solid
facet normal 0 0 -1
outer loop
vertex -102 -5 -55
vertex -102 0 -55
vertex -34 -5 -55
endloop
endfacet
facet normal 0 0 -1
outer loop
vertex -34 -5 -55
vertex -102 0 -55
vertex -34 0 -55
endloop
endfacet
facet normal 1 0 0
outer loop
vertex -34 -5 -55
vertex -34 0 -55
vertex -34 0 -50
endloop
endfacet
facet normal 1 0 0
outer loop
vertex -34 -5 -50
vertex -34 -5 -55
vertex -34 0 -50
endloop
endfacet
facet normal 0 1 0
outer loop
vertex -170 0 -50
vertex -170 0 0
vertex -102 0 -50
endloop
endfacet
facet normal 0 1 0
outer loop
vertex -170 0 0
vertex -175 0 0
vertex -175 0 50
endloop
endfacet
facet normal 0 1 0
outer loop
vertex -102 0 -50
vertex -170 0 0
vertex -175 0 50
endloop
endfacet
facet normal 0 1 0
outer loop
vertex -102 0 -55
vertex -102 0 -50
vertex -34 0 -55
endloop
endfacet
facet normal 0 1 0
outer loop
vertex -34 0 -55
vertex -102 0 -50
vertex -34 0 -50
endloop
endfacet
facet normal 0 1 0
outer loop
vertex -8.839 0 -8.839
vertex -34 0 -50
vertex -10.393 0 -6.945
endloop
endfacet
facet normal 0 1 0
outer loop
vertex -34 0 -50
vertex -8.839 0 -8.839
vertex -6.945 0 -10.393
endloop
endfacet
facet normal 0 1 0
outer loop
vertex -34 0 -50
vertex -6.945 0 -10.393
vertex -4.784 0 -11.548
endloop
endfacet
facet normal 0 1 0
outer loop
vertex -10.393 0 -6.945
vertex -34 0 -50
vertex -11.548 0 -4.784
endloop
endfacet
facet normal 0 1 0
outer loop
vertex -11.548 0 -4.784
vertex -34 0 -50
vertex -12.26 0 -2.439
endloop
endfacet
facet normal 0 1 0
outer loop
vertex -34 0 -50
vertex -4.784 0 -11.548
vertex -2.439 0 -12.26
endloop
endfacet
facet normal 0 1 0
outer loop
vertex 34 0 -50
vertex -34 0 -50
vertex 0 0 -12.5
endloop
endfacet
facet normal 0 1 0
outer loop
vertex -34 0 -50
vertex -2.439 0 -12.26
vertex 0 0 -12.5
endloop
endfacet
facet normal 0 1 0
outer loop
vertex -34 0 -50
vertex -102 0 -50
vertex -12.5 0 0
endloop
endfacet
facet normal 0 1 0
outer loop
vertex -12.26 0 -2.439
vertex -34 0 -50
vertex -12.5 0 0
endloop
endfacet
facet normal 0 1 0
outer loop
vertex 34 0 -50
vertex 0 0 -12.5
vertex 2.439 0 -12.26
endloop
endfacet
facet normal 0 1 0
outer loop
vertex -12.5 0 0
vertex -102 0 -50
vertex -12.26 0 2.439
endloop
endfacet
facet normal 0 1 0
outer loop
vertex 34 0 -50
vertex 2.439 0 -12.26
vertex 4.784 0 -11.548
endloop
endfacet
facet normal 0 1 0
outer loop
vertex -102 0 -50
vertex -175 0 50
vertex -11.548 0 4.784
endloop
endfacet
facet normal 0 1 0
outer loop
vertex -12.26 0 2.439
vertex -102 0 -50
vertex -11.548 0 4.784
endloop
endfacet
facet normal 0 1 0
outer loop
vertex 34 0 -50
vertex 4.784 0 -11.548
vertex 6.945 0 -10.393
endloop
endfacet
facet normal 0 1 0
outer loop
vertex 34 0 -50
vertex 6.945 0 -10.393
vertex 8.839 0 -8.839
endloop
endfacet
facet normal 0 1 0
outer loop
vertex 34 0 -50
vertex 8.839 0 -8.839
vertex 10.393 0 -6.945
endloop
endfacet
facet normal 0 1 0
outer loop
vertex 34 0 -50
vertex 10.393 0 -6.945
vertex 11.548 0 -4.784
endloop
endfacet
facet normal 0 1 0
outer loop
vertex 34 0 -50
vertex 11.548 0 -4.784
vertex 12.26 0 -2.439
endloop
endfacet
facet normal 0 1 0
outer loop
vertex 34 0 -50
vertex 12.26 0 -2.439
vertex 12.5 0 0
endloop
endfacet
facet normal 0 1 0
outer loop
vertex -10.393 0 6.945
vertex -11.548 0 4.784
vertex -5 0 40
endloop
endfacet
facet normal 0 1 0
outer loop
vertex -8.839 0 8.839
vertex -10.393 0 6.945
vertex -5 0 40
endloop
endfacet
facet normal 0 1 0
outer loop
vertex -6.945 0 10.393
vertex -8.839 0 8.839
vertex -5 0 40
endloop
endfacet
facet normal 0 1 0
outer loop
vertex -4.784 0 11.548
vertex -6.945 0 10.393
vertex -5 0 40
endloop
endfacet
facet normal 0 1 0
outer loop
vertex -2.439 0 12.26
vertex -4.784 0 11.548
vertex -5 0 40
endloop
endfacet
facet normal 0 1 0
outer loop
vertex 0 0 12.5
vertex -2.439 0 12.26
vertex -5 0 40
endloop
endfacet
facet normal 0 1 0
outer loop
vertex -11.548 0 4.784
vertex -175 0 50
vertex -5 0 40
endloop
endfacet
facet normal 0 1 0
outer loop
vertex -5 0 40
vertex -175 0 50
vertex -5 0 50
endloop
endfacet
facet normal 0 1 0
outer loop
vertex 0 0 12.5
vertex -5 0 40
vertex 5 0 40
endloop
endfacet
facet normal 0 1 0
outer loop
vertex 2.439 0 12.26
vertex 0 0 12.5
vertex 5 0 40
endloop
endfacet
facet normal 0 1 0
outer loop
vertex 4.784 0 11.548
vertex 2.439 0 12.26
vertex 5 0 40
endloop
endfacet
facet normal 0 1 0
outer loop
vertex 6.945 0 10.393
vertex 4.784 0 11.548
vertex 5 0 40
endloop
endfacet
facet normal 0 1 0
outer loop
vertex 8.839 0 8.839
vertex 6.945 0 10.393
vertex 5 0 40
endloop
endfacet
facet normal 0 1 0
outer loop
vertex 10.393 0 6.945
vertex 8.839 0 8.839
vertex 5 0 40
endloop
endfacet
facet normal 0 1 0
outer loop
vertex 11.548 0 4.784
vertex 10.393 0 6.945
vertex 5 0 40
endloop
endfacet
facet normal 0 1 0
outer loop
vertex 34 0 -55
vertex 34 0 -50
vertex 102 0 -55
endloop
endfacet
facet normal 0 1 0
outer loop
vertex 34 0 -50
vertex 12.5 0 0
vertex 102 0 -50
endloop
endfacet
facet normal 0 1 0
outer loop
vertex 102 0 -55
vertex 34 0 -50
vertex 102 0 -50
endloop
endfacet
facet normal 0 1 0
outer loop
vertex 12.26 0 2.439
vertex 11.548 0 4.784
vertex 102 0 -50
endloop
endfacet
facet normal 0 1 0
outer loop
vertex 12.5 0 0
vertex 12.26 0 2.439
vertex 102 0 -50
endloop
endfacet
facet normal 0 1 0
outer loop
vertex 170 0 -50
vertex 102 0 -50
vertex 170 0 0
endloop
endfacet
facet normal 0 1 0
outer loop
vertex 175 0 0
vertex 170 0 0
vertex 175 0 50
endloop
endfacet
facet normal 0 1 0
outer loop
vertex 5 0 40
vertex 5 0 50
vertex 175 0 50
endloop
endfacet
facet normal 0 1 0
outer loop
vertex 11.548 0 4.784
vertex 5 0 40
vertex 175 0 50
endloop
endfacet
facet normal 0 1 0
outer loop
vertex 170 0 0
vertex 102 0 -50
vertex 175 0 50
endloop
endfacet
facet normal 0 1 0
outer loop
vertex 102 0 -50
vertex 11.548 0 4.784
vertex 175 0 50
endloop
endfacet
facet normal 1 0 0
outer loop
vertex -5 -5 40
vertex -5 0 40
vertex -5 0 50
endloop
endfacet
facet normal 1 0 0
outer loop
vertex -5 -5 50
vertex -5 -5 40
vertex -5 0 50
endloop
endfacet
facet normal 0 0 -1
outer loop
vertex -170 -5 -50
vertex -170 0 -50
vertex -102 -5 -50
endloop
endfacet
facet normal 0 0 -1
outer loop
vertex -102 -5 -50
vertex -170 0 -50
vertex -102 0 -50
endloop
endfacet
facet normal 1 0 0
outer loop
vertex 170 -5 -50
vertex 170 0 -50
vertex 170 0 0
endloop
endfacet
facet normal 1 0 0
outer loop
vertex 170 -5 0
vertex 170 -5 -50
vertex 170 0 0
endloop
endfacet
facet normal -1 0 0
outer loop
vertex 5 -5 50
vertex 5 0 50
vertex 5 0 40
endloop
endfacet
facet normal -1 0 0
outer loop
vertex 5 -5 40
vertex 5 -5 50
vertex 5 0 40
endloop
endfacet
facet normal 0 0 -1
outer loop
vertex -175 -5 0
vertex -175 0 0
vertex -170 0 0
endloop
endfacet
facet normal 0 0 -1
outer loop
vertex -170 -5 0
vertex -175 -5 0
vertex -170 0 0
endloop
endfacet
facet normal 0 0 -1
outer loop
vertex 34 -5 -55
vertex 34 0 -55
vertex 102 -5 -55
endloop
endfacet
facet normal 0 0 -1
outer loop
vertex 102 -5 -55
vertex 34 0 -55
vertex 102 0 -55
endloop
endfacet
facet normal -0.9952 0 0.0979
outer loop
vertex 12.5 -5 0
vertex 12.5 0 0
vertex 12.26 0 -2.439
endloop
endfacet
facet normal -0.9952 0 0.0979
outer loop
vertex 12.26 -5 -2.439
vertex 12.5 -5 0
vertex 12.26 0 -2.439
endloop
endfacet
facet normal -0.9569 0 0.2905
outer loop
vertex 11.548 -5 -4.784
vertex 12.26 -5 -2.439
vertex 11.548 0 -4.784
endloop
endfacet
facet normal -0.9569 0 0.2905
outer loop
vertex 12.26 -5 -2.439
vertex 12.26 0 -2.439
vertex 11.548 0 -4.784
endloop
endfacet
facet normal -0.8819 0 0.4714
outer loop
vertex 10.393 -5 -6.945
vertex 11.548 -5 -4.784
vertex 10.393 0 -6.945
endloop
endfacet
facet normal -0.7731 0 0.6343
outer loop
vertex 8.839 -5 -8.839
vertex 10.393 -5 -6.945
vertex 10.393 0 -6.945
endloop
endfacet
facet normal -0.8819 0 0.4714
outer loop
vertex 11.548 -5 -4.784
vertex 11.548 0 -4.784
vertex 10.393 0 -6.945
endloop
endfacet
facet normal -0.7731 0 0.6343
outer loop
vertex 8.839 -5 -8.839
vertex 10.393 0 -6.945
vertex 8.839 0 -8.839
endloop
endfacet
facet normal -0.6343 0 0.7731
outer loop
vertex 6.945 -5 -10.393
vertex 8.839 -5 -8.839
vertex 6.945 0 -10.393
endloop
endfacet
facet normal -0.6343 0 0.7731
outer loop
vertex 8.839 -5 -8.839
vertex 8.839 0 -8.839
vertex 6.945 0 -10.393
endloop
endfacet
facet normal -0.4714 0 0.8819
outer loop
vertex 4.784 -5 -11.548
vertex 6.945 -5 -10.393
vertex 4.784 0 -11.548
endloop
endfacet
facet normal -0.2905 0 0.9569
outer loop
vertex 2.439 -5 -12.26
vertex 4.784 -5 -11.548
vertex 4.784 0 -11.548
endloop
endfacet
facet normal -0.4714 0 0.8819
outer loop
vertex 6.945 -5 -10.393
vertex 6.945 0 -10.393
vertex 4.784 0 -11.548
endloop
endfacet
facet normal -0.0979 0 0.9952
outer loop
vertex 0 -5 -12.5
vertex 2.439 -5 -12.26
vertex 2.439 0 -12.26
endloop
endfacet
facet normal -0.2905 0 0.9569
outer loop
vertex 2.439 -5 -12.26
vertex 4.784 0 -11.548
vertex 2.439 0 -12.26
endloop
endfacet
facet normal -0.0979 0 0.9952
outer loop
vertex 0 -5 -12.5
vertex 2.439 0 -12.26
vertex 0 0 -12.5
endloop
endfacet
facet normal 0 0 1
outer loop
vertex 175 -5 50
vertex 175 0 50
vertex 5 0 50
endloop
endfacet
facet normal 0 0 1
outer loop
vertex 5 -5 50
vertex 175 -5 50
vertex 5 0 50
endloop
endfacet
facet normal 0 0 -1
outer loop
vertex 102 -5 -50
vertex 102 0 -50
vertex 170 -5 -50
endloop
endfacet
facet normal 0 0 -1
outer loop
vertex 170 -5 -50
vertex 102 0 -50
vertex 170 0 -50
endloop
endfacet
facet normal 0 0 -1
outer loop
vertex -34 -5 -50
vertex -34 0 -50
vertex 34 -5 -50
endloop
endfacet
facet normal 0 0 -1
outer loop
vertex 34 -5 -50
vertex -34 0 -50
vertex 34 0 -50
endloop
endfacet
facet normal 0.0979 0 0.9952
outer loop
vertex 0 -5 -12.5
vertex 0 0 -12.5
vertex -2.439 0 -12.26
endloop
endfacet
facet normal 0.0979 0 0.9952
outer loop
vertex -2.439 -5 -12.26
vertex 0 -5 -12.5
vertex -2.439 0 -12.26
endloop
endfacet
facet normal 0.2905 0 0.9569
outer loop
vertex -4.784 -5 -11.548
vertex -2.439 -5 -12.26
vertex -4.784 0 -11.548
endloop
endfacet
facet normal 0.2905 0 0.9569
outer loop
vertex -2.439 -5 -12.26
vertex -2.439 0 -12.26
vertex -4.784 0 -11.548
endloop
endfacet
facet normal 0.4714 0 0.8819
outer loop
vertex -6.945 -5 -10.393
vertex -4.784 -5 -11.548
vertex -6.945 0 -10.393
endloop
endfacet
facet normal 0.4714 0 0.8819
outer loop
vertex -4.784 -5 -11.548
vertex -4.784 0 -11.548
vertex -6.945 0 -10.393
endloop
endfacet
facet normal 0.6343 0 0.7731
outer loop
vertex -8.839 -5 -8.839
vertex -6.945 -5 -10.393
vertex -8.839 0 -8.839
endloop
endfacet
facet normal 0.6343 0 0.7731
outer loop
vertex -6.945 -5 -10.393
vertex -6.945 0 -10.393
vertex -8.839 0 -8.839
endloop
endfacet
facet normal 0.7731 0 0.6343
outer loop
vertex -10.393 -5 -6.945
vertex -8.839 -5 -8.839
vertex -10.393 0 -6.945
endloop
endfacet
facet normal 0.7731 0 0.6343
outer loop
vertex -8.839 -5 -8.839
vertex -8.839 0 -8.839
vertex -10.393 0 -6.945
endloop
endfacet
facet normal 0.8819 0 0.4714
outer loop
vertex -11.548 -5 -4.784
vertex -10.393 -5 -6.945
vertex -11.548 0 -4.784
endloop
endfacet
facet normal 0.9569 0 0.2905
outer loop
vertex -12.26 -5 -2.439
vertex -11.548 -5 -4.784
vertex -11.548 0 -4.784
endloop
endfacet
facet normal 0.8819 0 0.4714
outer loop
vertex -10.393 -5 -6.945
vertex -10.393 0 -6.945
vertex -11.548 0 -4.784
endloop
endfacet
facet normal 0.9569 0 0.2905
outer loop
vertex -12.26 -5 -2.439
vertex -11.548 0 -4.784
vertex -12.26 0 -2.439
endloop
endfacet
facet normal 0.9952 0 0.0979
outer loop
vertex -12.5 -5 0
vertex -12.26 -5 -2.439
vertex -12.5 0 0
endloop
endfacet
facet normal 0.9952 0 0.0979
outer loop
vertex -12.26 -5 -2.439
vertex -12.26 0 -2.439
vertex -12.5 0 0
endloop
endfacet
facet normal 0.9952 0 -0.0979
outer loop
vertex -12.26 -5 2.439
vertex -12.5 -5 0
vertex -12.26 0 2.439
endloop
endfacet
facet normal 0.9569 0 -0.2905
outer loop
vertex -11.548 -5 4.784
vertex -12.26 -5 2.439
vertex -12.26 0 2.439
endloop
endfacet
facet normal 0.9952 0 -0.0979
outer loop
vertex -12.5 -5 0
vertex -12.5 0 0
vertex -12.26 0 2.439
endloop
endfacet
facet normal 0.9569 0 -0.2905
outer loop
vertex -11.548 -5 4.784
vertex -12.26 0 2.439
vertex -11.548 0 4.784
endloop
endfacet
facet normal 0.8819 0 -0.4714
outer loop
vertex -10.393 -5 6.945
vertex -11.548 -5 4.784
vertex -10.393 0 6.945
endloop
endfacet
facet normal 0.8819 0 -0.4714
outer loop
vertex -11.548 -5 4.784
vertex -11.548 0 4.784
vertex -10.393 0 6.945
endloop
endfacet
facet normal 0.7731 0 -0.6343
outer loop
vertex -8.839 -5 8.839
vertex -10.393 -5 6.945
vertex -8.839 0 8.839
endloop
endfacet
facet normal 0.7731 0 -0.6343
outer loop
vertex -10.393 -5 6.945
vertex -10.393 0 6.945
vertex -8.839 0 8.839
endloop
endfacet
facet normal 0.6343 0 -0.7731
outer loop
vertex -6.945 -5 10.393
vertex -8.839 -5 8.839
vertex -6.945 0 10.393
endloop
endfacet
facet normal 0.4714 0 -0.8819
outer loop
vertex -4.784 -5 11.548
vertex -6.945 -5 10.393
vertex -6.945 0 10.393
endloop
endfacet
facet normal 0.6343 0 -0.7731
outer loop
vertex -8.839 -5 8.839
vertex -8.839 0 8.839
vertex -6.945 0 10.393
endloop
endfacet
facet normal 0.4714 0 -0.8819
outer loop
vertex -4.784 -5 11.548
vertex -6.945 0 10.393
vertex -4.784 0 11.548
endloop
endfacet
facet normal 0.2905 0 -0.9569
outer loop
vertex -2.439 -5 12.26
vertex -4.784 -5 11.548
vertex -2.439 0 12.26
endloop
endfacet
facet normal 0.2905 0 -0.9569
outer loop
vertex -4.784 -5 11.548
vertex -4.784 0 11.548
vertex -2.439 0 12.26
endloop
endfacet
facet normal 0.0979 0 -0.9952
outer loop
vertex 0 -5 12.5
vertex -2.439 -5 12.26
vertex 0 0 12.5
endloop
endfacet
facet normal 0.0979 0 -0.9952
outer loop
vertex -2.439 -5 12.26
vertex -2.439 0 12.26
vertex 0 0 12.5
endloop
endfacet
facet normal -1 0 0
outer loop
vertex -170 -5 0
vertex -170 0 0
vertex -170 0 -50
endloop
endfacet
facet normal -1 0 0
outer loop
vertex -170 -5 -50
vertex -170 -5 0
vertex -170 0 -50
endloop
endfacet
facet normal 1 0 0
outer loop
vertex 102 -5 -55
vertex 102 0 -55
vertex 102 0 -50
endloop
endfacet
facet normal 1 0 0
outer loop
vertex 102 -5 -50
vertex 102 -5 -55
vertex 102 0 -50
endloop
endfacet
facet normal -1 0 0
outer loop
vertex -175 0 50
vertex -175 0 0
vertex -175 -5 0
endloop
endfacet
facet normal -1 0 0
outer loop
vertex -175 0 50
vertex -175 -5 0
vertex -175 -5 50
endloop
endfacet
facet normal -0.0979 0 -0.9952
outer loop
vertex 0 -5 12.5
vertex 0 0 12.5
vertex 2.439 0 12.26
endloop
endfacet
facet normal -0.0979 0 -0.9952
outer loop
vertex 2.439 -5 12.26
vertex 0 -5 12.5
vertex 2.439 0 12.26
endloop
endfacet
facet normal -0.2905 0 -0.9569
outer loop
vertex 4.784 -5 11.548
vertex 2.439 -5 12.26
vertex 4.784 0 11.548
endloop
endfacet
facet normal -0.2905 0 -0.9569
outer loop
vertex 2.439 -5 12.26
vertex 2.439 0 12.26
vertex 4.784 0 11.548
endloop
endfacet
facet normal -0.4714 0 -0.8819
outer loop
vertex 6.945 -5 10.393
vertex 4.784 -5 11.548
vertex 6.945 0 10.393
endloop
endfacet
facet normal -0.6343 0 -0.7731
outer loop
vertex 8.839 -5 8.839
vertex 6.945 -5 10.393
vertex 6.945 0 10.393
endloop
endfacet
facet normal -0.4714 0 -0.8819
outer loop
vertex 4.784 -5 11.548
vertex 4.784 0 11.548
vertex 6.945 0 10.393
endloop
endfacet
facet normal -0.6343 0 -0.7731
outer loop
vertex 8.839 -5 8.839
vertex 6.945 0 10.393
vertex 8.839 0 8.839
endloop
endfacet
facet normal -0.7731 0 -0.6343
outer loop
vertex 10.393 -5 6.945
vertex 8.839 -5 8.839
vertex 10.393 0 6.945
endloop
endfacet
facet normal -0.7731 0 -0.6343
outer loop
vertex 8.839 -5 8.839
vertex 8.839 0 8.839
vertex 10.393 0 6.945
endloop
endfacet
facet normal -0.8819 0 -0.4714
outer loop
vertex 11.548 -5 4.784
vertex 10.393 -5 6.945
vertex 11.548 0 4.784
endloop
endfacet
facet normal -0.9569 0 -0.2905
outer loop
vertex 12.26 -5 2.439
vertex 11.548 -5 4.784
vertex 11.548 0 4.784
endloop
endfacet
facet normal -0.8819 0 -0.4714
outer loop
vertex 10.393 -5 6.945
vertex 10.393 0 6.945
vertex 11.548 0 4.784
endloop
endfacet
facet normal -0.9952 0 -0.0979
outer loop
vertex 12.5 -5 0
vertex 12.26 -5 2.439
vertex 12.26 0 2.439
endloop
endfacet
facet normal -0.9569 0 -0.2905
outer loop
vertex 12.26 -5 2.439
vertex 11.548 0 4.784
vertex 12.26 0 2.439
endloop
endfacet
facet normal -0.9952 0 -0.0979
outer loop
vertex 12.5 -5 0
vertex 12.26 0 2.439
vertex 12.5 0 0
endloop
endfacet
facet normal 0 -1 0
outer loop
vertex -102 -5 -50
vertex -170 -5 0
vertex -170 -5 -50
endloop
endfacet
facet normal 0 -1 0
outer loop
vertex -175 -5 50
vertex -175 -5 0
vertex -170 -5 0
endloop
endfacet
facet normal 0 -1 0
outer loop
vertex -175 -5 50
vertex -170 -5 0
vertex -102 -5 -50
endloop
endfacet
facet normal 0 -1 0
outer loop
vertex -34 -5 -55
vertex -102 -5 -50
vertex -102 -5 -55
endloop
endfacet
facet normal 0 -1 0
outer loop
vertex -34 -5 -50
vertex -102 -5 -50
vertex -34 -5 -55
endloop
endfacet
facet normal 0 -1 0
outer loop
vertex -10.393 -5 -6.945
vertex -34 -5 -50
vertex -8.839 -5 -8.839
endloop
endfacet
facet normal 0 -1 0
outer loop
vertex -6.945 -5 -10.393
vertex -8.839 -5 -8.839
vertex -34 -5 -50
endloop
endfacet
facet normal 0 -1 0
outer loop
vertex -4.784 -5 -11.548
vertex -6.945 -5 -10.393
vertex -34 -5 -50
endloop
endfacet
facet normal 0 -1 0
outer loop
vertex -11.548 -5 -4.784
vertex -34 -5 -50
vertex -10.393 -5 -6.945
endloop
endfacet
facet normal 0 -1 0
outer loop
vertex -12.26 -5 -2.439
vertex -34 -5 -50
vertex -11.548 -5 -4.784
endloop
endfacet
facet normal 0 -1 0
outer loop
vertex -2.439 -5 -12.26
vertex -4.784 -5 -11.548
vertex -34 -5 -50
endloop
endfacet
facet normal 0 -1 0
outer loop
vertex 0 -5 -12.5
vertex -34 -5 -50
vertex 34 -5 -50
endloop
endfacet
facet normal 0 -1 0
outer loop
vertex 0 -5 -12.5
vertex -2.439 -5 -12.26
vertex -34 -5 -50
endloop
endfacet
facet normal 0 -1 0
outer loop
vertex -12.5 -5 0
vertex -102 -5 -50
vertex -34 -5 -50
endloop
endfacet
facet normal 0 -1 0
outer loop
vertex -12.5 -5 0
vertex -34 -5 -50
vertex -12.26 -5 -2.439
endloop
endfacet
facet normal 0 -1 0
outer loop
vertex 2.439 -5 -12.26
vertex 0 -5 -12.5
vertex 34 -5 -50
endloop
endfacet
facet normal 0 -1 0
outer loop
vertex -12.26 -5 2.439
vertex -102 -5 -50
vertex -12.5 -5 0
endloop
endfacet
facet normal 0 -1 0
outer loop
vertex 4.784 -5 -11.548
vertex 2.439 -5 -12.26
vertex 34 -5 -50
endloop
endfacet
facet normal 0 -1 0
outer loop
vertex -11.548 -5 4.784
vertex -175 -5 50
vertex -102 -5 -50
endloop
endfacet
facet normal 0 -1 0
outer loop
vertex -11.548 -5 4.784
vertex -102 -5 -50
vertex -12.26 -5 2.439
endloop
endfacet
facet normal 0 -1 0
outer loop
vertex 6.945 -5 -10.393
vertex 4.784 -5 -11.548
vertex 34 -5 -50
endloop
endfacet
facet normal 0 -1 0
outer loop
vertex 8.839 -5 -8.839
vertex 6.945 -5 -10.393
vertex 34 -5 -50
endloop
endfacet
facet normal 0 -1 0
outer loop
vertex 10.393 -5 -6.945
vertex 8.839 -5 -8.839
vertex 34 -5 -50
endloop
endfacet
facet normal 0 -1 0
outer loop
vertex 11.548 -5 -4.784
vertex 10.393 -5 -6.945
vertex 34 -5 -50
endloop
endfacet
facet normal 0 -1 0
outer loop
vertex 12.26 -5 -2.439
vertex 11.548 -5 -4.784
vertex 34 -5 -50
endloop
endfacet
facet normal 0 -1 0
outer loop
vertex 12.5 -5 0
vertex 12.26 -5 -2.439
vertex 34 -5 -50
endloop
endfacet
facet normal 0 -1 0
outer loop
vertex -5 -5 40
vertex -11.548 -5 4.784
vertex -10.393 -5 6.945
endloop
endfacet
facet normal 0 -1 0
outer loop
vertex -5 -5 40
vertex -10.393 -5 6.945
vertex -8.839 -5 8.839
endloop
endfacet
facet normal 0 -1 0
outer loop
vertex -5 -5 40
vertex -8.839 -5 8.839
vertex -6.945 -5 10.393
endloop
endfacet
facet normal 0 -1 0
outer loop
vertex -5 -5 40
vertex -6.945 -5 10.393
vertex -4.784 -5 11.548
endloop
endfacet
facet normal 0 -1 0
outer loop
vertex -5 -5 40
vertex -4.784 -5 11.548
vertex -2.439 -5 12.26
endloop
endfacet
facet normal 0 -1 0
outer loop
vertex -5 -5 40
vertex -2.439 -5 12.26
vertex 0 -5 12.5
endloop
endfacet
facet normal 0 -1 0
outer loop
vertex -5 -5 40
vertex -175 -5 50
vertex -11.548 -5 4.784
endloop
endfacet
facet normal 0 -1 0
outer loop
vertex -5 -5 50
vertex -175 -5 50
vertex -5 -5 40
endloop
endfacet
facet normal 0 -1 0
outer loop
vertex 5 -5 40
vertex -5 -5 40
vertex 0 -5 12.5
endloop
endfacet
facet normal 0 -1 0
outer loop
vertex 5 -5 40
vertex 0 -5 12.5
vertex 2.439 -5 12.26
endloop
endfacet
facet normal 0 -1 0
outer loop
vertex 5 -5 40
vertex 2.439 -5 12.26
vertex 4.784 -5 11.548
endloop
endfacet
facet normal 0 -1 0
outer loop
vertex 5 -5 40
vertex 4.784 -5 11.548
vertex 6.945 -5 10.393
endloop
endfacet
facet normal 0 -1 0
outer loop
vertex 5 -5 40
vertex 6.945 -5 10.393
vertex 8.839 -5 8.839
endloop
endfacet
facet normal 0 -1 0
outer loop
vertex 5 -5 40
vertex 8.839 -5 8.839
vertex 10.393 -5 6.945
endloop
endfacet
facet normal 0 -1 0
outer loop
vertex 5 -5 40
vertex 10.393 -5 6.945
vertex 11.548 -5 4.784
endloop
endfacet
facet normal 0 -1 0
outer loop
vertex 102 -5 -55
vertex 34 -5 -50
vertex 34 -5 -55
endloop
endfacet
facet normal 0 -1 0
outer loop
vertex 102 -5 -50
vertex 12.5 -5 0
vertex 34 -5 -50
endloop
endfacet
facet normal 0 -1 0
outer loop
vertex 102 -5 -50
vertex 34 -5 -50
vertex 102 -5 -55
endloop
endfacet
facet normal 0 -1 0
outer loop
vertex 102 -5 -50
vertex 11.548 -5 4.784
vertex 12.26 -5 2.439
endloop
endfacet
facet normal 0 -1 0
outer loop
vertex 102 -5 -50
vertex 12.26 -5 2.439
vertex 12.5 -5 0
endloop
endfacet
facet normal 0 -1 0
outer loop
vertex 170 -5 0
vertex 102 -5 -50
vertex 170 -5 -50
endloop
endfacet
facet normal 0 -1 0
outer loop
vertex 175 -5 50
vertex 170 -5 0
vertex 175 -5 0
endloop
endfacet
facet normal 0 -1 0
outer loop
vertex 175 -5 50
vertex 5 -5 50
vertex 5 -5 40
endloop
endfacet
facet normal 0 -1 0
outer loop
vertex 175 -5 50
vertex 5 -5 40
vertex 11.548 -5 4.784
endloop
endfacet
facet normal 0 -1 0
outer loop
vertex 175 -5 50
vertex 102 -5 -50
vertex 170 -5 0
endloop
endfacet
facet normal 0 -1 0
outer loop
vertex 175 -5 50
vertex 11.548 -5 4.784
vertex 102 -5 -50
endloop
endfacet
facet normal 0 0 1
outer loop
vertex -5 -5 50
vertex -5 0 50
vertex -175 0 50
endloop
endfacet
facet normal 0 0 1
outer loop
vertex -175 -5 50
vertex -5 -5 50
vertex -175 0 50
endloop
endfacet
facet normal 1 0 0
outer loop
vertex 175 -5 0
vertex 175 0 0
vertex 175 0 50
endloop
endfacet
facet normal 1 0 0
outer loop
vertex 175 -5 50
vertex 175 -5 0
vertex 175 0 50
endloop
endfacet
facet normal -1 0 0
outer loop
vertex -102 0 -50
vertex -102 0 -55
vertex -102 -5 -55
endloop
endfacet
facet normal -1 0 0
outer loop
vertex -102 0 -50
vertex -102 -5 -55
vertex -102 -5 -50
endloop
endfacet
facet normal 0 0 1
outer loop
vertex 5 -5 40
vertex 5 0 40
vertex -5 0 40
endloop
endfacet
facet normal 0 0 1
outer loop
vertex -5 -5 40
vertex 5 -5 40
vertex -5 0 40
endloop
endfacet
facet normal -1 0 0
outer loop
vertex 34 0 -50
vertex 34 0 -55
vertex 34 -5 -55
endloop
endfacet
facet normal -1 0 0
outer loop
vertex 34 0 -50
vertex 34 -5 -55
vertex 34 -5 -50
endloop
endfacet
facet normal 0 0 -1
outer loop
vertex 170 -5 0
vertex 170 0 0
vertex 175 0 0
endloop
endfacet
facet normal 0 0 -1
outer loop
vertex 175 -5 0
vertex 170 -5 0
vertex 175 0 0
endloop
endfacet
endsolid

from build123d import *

# Parameters (mm, degrees)
F0_W     = 68
F0_H     = 5
F0_W_2   = 5
F0_H_2   = 50
F1_DEPTH = 5


with BuildPart() as f1:
    # F0 (on Front) → F1 (new body)
    with BuildSketch(Plane.XZ):
        with BuildLine():
            Line((102, -50), (170, -50))
            Line((170, -50), (170, 0))
            Line((170, 0), (170, 50))
            Line((170, 50), (5, 50))
            Line((5, 50), (5, 40))
            Line((5, 40), (0, 40))
            Line((0, 40), (0, 12.5))
            ThreePointArc((0, 12.5), (8.838835, 8.838835), (12.5, 0))
            ThreePointArc((12.5, 0), (8.838835, -8.838835), (0, -12.5))
            Line((0, -12.5), (0, -50))
            Line((0, -50), (34, -50))
            Line((34, -50), (102, -50))
        make_face()
        with Locations((68, -52.5)):
            Rectangle(F0_W, F0_H)
        with Locations((172.5, 25)):
            Rectangle(F0_W_2, F0_H_2)
        with BuildLine():
            Line((-34, -50), (0, -50))
            Line((0, -50), (0, -12.5))
            ThreePointArc((0, -12.5), (-12.5, 0), (0, 12.5))
            Line((0, 12.5), (0, 40))
            Line((0, 40), (-5, 40))
            Line((-5, 40), (-5, 50))
            Line((-5, 50), (-170, 50))
            Line((-170, 50), (-170, 0))
            Line((-170, 0), (-170, -50))
            Line((-170, -50), (-102, -50))
            Line((-102, -50), (-34, -50))
        make_face()
        with Locations((-68, -52.5)):
            Rectangle(F0_W, F0_H)
        with Locations((-172.5, 25)):
            Rectangle(F0_W_2, F0_H_2)
    extrude(amount=F1_DEPTH)


solid = f1.part
